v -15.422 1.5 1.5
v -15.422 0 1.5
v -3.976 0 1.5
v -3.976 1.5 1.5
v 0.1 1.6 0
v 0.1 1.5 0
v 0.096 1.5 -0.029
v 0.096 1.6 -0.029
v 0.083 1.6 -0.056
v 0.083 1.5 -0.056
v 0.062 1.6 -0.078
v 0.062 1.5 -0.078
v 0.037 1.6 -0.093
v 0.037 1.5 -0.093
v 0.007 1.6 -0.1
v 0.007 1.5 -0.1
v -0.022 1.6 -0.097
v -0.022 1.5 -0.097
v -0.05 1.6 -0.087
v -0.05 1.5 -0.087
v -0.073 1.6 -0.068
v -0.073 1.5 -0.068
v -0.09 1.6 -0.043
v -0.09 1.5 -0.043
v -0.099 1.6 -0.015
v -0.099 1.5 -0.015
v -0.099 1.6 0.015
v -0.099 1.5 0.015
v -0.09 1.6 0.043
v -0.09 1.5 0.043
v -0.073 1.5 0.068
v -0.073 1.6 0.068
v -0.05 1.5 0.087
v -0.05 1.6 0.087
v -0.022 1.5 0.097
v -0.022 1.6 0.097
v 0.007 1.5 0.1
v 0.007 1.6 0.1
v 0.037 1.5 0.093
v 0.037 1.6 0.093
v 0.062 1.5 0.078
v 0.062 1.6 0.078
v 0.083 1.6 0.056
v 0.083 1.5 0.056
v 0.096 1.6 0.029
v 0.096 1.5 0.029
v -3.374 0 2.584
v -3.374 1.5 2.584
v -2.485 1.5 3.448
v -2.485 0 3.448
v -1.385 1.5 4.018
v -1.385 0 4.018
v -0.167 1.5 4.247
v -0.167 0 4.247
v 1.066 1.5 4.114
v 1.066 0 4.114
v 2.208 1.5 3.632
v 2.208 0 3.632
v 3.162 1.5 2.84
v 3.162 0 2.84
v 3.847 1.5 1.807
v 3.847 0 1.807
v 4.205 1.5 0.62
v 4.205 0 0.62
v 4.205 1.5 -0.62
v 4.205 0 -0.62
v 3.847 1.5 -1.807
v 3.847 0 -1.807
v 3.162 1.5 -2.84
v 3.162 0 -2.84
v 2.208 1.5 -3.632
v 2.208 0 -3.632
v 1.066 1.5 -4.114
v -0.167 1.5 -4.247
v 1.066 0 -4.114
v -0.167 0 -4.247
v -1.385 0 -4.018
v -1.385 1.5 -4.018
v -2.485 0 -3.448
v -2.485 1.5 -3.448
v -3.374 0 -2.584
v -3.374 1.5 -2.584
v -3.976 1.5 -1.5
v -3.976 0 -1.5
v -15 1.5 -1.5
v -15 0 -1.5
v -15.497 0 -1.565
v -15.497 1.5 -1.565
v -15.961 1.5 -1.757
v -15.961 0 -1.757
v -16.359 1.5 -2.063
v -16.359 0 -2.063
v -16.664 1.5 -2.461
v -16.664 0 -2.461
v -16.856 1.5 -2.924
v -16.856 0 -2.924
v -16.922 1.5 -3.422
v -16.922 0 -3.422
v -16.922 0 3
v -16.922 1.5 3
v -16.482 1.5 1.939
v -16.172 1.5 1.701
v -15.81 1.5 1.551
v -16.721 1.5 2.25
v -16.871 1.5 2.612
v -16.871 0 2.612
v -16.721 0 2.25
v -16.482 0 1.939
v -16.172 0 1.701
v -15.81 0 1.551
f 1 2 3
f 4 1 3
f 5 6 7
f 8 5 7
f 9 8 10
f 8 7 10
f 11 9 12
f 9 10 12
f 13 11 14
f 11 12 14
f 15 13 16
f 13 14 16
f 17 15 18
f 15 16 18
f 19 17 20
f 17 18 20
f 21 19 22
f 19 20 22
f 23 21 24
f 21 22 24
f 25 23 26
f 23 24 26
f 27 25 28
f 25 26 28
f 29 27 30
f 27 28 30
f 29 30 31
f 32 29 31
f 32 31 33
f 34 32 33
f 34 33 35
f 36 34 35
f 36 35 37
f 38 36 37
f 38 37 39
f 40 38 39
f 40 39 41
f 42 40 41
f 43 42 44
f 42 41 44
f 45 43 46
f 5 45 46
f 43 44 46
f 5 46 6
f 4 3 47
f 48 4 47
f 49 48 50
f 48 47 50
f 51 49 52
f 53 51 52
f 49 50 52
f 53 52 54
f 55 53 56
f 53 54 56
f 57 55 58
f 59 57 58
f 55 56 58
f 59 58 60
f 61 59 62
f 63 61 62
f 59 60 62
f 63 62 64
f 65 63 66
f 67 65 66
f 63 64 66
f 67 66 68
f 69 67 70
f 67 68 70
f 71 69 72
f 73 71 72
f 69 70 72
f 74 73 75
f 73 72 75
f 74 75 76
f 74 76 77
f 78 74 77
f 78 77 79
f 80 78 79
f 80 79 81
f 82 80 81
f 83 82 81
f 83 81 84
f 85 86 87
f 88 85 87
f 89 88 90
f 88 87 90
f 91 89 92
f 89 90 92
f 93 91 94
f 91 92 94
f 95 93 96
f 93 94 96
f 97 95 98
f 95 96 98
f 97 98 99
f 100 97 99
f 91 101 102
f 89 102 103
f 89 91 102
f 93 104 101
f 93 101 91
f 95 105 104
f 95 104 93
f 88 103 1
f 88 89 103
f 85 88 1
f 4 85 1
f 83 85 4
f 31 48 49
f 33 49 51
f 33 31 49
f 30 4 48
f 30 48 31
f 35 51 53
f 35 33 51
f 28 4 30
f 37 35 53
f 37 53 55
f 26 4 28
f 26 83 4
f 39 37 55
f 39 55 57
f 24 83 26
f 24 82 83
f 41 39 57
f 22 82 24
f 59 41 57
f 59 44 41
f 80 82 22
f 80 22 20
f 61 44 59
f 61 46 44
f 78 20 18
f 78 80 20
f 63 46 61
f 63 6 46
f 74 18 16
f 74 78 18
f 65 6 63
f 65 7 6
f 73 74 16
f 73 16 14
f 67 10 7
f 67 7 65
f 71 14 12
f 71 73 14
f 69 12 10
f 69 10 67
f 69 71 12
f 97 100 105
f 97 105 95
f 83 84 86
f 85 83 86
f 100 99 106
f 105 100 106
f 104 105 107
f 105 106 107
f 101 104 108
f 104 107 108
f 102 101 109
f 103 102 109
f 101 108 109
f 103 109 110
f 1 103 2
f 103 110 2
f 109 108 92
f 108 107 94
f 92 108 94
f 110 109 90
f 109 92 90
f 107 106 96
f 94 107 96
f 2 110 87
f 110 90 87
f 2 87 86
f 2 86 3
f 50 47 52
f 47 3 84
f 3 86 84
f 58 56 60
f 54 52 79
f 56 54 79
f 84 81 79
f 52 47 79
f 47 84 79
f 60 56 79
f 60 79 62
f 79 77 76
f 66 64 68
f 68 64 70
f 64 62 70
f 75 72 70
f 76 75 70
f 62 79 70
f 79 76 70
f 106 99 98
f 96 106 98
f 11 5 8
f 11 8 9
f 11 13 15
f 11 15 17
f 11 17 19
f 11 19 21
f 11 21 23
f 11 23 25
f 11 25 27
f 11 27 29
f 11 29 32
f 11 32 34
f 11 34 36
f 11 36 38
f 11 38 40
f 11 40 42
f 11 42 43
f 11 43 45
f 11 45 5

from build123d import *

# Parameters (mm, degrees)
RESSALTO_EXTRUS_O1_DEPTH = 1.5
ESBO_O2_R                = 0.1
RESSALTO_EXTRUS_O2_DEPTH = 0.1


with BuildPart() as part:
    # Esboço1 → Ressalto-extrusão1 (new body)
    with BuildSketch(Plane(origin=(0, 0, 0), x_dir=(1, 0, 0), z_dir=(0, 1, 0))):
        with BuildLine():
            Line((-3.97649343, 1.5), (-15, 1.5))
            ThreePointArc((-15, 1.5), (-16.358835062, 2.062847912), (-16.921682974, 3.421682974))
            Line((-16.921682974, 3.421682974), (-16.921682974, -3))
            ThreePointArc((-16.921682974, -3), (-16.482343146, -1.939339828), (-15.421682974, -1.5))
            Line((-15.421682974, -1.5), (-3.97649343, -1.5))
            ThreePointArc((-3.97649343, -1.5), (4.25, 0), (-3.97649343, 1.5))
        make_face()
    extrude(amount=RESSALTO_EXTRUS_O1_DEPTH)

    # Esboço2 → Ressalto-extrusão2 (add)
    with BuildSketch(Plane(origin=(0, 1.5, 0), x_dir=(1, 0, 0), z_dir=(0, 1, 0))):
        Circle(ESBO_O2_R)
    extrude(amount=RESSALTO_EXTRUS_O2_DEPTH)


solid = part.part
